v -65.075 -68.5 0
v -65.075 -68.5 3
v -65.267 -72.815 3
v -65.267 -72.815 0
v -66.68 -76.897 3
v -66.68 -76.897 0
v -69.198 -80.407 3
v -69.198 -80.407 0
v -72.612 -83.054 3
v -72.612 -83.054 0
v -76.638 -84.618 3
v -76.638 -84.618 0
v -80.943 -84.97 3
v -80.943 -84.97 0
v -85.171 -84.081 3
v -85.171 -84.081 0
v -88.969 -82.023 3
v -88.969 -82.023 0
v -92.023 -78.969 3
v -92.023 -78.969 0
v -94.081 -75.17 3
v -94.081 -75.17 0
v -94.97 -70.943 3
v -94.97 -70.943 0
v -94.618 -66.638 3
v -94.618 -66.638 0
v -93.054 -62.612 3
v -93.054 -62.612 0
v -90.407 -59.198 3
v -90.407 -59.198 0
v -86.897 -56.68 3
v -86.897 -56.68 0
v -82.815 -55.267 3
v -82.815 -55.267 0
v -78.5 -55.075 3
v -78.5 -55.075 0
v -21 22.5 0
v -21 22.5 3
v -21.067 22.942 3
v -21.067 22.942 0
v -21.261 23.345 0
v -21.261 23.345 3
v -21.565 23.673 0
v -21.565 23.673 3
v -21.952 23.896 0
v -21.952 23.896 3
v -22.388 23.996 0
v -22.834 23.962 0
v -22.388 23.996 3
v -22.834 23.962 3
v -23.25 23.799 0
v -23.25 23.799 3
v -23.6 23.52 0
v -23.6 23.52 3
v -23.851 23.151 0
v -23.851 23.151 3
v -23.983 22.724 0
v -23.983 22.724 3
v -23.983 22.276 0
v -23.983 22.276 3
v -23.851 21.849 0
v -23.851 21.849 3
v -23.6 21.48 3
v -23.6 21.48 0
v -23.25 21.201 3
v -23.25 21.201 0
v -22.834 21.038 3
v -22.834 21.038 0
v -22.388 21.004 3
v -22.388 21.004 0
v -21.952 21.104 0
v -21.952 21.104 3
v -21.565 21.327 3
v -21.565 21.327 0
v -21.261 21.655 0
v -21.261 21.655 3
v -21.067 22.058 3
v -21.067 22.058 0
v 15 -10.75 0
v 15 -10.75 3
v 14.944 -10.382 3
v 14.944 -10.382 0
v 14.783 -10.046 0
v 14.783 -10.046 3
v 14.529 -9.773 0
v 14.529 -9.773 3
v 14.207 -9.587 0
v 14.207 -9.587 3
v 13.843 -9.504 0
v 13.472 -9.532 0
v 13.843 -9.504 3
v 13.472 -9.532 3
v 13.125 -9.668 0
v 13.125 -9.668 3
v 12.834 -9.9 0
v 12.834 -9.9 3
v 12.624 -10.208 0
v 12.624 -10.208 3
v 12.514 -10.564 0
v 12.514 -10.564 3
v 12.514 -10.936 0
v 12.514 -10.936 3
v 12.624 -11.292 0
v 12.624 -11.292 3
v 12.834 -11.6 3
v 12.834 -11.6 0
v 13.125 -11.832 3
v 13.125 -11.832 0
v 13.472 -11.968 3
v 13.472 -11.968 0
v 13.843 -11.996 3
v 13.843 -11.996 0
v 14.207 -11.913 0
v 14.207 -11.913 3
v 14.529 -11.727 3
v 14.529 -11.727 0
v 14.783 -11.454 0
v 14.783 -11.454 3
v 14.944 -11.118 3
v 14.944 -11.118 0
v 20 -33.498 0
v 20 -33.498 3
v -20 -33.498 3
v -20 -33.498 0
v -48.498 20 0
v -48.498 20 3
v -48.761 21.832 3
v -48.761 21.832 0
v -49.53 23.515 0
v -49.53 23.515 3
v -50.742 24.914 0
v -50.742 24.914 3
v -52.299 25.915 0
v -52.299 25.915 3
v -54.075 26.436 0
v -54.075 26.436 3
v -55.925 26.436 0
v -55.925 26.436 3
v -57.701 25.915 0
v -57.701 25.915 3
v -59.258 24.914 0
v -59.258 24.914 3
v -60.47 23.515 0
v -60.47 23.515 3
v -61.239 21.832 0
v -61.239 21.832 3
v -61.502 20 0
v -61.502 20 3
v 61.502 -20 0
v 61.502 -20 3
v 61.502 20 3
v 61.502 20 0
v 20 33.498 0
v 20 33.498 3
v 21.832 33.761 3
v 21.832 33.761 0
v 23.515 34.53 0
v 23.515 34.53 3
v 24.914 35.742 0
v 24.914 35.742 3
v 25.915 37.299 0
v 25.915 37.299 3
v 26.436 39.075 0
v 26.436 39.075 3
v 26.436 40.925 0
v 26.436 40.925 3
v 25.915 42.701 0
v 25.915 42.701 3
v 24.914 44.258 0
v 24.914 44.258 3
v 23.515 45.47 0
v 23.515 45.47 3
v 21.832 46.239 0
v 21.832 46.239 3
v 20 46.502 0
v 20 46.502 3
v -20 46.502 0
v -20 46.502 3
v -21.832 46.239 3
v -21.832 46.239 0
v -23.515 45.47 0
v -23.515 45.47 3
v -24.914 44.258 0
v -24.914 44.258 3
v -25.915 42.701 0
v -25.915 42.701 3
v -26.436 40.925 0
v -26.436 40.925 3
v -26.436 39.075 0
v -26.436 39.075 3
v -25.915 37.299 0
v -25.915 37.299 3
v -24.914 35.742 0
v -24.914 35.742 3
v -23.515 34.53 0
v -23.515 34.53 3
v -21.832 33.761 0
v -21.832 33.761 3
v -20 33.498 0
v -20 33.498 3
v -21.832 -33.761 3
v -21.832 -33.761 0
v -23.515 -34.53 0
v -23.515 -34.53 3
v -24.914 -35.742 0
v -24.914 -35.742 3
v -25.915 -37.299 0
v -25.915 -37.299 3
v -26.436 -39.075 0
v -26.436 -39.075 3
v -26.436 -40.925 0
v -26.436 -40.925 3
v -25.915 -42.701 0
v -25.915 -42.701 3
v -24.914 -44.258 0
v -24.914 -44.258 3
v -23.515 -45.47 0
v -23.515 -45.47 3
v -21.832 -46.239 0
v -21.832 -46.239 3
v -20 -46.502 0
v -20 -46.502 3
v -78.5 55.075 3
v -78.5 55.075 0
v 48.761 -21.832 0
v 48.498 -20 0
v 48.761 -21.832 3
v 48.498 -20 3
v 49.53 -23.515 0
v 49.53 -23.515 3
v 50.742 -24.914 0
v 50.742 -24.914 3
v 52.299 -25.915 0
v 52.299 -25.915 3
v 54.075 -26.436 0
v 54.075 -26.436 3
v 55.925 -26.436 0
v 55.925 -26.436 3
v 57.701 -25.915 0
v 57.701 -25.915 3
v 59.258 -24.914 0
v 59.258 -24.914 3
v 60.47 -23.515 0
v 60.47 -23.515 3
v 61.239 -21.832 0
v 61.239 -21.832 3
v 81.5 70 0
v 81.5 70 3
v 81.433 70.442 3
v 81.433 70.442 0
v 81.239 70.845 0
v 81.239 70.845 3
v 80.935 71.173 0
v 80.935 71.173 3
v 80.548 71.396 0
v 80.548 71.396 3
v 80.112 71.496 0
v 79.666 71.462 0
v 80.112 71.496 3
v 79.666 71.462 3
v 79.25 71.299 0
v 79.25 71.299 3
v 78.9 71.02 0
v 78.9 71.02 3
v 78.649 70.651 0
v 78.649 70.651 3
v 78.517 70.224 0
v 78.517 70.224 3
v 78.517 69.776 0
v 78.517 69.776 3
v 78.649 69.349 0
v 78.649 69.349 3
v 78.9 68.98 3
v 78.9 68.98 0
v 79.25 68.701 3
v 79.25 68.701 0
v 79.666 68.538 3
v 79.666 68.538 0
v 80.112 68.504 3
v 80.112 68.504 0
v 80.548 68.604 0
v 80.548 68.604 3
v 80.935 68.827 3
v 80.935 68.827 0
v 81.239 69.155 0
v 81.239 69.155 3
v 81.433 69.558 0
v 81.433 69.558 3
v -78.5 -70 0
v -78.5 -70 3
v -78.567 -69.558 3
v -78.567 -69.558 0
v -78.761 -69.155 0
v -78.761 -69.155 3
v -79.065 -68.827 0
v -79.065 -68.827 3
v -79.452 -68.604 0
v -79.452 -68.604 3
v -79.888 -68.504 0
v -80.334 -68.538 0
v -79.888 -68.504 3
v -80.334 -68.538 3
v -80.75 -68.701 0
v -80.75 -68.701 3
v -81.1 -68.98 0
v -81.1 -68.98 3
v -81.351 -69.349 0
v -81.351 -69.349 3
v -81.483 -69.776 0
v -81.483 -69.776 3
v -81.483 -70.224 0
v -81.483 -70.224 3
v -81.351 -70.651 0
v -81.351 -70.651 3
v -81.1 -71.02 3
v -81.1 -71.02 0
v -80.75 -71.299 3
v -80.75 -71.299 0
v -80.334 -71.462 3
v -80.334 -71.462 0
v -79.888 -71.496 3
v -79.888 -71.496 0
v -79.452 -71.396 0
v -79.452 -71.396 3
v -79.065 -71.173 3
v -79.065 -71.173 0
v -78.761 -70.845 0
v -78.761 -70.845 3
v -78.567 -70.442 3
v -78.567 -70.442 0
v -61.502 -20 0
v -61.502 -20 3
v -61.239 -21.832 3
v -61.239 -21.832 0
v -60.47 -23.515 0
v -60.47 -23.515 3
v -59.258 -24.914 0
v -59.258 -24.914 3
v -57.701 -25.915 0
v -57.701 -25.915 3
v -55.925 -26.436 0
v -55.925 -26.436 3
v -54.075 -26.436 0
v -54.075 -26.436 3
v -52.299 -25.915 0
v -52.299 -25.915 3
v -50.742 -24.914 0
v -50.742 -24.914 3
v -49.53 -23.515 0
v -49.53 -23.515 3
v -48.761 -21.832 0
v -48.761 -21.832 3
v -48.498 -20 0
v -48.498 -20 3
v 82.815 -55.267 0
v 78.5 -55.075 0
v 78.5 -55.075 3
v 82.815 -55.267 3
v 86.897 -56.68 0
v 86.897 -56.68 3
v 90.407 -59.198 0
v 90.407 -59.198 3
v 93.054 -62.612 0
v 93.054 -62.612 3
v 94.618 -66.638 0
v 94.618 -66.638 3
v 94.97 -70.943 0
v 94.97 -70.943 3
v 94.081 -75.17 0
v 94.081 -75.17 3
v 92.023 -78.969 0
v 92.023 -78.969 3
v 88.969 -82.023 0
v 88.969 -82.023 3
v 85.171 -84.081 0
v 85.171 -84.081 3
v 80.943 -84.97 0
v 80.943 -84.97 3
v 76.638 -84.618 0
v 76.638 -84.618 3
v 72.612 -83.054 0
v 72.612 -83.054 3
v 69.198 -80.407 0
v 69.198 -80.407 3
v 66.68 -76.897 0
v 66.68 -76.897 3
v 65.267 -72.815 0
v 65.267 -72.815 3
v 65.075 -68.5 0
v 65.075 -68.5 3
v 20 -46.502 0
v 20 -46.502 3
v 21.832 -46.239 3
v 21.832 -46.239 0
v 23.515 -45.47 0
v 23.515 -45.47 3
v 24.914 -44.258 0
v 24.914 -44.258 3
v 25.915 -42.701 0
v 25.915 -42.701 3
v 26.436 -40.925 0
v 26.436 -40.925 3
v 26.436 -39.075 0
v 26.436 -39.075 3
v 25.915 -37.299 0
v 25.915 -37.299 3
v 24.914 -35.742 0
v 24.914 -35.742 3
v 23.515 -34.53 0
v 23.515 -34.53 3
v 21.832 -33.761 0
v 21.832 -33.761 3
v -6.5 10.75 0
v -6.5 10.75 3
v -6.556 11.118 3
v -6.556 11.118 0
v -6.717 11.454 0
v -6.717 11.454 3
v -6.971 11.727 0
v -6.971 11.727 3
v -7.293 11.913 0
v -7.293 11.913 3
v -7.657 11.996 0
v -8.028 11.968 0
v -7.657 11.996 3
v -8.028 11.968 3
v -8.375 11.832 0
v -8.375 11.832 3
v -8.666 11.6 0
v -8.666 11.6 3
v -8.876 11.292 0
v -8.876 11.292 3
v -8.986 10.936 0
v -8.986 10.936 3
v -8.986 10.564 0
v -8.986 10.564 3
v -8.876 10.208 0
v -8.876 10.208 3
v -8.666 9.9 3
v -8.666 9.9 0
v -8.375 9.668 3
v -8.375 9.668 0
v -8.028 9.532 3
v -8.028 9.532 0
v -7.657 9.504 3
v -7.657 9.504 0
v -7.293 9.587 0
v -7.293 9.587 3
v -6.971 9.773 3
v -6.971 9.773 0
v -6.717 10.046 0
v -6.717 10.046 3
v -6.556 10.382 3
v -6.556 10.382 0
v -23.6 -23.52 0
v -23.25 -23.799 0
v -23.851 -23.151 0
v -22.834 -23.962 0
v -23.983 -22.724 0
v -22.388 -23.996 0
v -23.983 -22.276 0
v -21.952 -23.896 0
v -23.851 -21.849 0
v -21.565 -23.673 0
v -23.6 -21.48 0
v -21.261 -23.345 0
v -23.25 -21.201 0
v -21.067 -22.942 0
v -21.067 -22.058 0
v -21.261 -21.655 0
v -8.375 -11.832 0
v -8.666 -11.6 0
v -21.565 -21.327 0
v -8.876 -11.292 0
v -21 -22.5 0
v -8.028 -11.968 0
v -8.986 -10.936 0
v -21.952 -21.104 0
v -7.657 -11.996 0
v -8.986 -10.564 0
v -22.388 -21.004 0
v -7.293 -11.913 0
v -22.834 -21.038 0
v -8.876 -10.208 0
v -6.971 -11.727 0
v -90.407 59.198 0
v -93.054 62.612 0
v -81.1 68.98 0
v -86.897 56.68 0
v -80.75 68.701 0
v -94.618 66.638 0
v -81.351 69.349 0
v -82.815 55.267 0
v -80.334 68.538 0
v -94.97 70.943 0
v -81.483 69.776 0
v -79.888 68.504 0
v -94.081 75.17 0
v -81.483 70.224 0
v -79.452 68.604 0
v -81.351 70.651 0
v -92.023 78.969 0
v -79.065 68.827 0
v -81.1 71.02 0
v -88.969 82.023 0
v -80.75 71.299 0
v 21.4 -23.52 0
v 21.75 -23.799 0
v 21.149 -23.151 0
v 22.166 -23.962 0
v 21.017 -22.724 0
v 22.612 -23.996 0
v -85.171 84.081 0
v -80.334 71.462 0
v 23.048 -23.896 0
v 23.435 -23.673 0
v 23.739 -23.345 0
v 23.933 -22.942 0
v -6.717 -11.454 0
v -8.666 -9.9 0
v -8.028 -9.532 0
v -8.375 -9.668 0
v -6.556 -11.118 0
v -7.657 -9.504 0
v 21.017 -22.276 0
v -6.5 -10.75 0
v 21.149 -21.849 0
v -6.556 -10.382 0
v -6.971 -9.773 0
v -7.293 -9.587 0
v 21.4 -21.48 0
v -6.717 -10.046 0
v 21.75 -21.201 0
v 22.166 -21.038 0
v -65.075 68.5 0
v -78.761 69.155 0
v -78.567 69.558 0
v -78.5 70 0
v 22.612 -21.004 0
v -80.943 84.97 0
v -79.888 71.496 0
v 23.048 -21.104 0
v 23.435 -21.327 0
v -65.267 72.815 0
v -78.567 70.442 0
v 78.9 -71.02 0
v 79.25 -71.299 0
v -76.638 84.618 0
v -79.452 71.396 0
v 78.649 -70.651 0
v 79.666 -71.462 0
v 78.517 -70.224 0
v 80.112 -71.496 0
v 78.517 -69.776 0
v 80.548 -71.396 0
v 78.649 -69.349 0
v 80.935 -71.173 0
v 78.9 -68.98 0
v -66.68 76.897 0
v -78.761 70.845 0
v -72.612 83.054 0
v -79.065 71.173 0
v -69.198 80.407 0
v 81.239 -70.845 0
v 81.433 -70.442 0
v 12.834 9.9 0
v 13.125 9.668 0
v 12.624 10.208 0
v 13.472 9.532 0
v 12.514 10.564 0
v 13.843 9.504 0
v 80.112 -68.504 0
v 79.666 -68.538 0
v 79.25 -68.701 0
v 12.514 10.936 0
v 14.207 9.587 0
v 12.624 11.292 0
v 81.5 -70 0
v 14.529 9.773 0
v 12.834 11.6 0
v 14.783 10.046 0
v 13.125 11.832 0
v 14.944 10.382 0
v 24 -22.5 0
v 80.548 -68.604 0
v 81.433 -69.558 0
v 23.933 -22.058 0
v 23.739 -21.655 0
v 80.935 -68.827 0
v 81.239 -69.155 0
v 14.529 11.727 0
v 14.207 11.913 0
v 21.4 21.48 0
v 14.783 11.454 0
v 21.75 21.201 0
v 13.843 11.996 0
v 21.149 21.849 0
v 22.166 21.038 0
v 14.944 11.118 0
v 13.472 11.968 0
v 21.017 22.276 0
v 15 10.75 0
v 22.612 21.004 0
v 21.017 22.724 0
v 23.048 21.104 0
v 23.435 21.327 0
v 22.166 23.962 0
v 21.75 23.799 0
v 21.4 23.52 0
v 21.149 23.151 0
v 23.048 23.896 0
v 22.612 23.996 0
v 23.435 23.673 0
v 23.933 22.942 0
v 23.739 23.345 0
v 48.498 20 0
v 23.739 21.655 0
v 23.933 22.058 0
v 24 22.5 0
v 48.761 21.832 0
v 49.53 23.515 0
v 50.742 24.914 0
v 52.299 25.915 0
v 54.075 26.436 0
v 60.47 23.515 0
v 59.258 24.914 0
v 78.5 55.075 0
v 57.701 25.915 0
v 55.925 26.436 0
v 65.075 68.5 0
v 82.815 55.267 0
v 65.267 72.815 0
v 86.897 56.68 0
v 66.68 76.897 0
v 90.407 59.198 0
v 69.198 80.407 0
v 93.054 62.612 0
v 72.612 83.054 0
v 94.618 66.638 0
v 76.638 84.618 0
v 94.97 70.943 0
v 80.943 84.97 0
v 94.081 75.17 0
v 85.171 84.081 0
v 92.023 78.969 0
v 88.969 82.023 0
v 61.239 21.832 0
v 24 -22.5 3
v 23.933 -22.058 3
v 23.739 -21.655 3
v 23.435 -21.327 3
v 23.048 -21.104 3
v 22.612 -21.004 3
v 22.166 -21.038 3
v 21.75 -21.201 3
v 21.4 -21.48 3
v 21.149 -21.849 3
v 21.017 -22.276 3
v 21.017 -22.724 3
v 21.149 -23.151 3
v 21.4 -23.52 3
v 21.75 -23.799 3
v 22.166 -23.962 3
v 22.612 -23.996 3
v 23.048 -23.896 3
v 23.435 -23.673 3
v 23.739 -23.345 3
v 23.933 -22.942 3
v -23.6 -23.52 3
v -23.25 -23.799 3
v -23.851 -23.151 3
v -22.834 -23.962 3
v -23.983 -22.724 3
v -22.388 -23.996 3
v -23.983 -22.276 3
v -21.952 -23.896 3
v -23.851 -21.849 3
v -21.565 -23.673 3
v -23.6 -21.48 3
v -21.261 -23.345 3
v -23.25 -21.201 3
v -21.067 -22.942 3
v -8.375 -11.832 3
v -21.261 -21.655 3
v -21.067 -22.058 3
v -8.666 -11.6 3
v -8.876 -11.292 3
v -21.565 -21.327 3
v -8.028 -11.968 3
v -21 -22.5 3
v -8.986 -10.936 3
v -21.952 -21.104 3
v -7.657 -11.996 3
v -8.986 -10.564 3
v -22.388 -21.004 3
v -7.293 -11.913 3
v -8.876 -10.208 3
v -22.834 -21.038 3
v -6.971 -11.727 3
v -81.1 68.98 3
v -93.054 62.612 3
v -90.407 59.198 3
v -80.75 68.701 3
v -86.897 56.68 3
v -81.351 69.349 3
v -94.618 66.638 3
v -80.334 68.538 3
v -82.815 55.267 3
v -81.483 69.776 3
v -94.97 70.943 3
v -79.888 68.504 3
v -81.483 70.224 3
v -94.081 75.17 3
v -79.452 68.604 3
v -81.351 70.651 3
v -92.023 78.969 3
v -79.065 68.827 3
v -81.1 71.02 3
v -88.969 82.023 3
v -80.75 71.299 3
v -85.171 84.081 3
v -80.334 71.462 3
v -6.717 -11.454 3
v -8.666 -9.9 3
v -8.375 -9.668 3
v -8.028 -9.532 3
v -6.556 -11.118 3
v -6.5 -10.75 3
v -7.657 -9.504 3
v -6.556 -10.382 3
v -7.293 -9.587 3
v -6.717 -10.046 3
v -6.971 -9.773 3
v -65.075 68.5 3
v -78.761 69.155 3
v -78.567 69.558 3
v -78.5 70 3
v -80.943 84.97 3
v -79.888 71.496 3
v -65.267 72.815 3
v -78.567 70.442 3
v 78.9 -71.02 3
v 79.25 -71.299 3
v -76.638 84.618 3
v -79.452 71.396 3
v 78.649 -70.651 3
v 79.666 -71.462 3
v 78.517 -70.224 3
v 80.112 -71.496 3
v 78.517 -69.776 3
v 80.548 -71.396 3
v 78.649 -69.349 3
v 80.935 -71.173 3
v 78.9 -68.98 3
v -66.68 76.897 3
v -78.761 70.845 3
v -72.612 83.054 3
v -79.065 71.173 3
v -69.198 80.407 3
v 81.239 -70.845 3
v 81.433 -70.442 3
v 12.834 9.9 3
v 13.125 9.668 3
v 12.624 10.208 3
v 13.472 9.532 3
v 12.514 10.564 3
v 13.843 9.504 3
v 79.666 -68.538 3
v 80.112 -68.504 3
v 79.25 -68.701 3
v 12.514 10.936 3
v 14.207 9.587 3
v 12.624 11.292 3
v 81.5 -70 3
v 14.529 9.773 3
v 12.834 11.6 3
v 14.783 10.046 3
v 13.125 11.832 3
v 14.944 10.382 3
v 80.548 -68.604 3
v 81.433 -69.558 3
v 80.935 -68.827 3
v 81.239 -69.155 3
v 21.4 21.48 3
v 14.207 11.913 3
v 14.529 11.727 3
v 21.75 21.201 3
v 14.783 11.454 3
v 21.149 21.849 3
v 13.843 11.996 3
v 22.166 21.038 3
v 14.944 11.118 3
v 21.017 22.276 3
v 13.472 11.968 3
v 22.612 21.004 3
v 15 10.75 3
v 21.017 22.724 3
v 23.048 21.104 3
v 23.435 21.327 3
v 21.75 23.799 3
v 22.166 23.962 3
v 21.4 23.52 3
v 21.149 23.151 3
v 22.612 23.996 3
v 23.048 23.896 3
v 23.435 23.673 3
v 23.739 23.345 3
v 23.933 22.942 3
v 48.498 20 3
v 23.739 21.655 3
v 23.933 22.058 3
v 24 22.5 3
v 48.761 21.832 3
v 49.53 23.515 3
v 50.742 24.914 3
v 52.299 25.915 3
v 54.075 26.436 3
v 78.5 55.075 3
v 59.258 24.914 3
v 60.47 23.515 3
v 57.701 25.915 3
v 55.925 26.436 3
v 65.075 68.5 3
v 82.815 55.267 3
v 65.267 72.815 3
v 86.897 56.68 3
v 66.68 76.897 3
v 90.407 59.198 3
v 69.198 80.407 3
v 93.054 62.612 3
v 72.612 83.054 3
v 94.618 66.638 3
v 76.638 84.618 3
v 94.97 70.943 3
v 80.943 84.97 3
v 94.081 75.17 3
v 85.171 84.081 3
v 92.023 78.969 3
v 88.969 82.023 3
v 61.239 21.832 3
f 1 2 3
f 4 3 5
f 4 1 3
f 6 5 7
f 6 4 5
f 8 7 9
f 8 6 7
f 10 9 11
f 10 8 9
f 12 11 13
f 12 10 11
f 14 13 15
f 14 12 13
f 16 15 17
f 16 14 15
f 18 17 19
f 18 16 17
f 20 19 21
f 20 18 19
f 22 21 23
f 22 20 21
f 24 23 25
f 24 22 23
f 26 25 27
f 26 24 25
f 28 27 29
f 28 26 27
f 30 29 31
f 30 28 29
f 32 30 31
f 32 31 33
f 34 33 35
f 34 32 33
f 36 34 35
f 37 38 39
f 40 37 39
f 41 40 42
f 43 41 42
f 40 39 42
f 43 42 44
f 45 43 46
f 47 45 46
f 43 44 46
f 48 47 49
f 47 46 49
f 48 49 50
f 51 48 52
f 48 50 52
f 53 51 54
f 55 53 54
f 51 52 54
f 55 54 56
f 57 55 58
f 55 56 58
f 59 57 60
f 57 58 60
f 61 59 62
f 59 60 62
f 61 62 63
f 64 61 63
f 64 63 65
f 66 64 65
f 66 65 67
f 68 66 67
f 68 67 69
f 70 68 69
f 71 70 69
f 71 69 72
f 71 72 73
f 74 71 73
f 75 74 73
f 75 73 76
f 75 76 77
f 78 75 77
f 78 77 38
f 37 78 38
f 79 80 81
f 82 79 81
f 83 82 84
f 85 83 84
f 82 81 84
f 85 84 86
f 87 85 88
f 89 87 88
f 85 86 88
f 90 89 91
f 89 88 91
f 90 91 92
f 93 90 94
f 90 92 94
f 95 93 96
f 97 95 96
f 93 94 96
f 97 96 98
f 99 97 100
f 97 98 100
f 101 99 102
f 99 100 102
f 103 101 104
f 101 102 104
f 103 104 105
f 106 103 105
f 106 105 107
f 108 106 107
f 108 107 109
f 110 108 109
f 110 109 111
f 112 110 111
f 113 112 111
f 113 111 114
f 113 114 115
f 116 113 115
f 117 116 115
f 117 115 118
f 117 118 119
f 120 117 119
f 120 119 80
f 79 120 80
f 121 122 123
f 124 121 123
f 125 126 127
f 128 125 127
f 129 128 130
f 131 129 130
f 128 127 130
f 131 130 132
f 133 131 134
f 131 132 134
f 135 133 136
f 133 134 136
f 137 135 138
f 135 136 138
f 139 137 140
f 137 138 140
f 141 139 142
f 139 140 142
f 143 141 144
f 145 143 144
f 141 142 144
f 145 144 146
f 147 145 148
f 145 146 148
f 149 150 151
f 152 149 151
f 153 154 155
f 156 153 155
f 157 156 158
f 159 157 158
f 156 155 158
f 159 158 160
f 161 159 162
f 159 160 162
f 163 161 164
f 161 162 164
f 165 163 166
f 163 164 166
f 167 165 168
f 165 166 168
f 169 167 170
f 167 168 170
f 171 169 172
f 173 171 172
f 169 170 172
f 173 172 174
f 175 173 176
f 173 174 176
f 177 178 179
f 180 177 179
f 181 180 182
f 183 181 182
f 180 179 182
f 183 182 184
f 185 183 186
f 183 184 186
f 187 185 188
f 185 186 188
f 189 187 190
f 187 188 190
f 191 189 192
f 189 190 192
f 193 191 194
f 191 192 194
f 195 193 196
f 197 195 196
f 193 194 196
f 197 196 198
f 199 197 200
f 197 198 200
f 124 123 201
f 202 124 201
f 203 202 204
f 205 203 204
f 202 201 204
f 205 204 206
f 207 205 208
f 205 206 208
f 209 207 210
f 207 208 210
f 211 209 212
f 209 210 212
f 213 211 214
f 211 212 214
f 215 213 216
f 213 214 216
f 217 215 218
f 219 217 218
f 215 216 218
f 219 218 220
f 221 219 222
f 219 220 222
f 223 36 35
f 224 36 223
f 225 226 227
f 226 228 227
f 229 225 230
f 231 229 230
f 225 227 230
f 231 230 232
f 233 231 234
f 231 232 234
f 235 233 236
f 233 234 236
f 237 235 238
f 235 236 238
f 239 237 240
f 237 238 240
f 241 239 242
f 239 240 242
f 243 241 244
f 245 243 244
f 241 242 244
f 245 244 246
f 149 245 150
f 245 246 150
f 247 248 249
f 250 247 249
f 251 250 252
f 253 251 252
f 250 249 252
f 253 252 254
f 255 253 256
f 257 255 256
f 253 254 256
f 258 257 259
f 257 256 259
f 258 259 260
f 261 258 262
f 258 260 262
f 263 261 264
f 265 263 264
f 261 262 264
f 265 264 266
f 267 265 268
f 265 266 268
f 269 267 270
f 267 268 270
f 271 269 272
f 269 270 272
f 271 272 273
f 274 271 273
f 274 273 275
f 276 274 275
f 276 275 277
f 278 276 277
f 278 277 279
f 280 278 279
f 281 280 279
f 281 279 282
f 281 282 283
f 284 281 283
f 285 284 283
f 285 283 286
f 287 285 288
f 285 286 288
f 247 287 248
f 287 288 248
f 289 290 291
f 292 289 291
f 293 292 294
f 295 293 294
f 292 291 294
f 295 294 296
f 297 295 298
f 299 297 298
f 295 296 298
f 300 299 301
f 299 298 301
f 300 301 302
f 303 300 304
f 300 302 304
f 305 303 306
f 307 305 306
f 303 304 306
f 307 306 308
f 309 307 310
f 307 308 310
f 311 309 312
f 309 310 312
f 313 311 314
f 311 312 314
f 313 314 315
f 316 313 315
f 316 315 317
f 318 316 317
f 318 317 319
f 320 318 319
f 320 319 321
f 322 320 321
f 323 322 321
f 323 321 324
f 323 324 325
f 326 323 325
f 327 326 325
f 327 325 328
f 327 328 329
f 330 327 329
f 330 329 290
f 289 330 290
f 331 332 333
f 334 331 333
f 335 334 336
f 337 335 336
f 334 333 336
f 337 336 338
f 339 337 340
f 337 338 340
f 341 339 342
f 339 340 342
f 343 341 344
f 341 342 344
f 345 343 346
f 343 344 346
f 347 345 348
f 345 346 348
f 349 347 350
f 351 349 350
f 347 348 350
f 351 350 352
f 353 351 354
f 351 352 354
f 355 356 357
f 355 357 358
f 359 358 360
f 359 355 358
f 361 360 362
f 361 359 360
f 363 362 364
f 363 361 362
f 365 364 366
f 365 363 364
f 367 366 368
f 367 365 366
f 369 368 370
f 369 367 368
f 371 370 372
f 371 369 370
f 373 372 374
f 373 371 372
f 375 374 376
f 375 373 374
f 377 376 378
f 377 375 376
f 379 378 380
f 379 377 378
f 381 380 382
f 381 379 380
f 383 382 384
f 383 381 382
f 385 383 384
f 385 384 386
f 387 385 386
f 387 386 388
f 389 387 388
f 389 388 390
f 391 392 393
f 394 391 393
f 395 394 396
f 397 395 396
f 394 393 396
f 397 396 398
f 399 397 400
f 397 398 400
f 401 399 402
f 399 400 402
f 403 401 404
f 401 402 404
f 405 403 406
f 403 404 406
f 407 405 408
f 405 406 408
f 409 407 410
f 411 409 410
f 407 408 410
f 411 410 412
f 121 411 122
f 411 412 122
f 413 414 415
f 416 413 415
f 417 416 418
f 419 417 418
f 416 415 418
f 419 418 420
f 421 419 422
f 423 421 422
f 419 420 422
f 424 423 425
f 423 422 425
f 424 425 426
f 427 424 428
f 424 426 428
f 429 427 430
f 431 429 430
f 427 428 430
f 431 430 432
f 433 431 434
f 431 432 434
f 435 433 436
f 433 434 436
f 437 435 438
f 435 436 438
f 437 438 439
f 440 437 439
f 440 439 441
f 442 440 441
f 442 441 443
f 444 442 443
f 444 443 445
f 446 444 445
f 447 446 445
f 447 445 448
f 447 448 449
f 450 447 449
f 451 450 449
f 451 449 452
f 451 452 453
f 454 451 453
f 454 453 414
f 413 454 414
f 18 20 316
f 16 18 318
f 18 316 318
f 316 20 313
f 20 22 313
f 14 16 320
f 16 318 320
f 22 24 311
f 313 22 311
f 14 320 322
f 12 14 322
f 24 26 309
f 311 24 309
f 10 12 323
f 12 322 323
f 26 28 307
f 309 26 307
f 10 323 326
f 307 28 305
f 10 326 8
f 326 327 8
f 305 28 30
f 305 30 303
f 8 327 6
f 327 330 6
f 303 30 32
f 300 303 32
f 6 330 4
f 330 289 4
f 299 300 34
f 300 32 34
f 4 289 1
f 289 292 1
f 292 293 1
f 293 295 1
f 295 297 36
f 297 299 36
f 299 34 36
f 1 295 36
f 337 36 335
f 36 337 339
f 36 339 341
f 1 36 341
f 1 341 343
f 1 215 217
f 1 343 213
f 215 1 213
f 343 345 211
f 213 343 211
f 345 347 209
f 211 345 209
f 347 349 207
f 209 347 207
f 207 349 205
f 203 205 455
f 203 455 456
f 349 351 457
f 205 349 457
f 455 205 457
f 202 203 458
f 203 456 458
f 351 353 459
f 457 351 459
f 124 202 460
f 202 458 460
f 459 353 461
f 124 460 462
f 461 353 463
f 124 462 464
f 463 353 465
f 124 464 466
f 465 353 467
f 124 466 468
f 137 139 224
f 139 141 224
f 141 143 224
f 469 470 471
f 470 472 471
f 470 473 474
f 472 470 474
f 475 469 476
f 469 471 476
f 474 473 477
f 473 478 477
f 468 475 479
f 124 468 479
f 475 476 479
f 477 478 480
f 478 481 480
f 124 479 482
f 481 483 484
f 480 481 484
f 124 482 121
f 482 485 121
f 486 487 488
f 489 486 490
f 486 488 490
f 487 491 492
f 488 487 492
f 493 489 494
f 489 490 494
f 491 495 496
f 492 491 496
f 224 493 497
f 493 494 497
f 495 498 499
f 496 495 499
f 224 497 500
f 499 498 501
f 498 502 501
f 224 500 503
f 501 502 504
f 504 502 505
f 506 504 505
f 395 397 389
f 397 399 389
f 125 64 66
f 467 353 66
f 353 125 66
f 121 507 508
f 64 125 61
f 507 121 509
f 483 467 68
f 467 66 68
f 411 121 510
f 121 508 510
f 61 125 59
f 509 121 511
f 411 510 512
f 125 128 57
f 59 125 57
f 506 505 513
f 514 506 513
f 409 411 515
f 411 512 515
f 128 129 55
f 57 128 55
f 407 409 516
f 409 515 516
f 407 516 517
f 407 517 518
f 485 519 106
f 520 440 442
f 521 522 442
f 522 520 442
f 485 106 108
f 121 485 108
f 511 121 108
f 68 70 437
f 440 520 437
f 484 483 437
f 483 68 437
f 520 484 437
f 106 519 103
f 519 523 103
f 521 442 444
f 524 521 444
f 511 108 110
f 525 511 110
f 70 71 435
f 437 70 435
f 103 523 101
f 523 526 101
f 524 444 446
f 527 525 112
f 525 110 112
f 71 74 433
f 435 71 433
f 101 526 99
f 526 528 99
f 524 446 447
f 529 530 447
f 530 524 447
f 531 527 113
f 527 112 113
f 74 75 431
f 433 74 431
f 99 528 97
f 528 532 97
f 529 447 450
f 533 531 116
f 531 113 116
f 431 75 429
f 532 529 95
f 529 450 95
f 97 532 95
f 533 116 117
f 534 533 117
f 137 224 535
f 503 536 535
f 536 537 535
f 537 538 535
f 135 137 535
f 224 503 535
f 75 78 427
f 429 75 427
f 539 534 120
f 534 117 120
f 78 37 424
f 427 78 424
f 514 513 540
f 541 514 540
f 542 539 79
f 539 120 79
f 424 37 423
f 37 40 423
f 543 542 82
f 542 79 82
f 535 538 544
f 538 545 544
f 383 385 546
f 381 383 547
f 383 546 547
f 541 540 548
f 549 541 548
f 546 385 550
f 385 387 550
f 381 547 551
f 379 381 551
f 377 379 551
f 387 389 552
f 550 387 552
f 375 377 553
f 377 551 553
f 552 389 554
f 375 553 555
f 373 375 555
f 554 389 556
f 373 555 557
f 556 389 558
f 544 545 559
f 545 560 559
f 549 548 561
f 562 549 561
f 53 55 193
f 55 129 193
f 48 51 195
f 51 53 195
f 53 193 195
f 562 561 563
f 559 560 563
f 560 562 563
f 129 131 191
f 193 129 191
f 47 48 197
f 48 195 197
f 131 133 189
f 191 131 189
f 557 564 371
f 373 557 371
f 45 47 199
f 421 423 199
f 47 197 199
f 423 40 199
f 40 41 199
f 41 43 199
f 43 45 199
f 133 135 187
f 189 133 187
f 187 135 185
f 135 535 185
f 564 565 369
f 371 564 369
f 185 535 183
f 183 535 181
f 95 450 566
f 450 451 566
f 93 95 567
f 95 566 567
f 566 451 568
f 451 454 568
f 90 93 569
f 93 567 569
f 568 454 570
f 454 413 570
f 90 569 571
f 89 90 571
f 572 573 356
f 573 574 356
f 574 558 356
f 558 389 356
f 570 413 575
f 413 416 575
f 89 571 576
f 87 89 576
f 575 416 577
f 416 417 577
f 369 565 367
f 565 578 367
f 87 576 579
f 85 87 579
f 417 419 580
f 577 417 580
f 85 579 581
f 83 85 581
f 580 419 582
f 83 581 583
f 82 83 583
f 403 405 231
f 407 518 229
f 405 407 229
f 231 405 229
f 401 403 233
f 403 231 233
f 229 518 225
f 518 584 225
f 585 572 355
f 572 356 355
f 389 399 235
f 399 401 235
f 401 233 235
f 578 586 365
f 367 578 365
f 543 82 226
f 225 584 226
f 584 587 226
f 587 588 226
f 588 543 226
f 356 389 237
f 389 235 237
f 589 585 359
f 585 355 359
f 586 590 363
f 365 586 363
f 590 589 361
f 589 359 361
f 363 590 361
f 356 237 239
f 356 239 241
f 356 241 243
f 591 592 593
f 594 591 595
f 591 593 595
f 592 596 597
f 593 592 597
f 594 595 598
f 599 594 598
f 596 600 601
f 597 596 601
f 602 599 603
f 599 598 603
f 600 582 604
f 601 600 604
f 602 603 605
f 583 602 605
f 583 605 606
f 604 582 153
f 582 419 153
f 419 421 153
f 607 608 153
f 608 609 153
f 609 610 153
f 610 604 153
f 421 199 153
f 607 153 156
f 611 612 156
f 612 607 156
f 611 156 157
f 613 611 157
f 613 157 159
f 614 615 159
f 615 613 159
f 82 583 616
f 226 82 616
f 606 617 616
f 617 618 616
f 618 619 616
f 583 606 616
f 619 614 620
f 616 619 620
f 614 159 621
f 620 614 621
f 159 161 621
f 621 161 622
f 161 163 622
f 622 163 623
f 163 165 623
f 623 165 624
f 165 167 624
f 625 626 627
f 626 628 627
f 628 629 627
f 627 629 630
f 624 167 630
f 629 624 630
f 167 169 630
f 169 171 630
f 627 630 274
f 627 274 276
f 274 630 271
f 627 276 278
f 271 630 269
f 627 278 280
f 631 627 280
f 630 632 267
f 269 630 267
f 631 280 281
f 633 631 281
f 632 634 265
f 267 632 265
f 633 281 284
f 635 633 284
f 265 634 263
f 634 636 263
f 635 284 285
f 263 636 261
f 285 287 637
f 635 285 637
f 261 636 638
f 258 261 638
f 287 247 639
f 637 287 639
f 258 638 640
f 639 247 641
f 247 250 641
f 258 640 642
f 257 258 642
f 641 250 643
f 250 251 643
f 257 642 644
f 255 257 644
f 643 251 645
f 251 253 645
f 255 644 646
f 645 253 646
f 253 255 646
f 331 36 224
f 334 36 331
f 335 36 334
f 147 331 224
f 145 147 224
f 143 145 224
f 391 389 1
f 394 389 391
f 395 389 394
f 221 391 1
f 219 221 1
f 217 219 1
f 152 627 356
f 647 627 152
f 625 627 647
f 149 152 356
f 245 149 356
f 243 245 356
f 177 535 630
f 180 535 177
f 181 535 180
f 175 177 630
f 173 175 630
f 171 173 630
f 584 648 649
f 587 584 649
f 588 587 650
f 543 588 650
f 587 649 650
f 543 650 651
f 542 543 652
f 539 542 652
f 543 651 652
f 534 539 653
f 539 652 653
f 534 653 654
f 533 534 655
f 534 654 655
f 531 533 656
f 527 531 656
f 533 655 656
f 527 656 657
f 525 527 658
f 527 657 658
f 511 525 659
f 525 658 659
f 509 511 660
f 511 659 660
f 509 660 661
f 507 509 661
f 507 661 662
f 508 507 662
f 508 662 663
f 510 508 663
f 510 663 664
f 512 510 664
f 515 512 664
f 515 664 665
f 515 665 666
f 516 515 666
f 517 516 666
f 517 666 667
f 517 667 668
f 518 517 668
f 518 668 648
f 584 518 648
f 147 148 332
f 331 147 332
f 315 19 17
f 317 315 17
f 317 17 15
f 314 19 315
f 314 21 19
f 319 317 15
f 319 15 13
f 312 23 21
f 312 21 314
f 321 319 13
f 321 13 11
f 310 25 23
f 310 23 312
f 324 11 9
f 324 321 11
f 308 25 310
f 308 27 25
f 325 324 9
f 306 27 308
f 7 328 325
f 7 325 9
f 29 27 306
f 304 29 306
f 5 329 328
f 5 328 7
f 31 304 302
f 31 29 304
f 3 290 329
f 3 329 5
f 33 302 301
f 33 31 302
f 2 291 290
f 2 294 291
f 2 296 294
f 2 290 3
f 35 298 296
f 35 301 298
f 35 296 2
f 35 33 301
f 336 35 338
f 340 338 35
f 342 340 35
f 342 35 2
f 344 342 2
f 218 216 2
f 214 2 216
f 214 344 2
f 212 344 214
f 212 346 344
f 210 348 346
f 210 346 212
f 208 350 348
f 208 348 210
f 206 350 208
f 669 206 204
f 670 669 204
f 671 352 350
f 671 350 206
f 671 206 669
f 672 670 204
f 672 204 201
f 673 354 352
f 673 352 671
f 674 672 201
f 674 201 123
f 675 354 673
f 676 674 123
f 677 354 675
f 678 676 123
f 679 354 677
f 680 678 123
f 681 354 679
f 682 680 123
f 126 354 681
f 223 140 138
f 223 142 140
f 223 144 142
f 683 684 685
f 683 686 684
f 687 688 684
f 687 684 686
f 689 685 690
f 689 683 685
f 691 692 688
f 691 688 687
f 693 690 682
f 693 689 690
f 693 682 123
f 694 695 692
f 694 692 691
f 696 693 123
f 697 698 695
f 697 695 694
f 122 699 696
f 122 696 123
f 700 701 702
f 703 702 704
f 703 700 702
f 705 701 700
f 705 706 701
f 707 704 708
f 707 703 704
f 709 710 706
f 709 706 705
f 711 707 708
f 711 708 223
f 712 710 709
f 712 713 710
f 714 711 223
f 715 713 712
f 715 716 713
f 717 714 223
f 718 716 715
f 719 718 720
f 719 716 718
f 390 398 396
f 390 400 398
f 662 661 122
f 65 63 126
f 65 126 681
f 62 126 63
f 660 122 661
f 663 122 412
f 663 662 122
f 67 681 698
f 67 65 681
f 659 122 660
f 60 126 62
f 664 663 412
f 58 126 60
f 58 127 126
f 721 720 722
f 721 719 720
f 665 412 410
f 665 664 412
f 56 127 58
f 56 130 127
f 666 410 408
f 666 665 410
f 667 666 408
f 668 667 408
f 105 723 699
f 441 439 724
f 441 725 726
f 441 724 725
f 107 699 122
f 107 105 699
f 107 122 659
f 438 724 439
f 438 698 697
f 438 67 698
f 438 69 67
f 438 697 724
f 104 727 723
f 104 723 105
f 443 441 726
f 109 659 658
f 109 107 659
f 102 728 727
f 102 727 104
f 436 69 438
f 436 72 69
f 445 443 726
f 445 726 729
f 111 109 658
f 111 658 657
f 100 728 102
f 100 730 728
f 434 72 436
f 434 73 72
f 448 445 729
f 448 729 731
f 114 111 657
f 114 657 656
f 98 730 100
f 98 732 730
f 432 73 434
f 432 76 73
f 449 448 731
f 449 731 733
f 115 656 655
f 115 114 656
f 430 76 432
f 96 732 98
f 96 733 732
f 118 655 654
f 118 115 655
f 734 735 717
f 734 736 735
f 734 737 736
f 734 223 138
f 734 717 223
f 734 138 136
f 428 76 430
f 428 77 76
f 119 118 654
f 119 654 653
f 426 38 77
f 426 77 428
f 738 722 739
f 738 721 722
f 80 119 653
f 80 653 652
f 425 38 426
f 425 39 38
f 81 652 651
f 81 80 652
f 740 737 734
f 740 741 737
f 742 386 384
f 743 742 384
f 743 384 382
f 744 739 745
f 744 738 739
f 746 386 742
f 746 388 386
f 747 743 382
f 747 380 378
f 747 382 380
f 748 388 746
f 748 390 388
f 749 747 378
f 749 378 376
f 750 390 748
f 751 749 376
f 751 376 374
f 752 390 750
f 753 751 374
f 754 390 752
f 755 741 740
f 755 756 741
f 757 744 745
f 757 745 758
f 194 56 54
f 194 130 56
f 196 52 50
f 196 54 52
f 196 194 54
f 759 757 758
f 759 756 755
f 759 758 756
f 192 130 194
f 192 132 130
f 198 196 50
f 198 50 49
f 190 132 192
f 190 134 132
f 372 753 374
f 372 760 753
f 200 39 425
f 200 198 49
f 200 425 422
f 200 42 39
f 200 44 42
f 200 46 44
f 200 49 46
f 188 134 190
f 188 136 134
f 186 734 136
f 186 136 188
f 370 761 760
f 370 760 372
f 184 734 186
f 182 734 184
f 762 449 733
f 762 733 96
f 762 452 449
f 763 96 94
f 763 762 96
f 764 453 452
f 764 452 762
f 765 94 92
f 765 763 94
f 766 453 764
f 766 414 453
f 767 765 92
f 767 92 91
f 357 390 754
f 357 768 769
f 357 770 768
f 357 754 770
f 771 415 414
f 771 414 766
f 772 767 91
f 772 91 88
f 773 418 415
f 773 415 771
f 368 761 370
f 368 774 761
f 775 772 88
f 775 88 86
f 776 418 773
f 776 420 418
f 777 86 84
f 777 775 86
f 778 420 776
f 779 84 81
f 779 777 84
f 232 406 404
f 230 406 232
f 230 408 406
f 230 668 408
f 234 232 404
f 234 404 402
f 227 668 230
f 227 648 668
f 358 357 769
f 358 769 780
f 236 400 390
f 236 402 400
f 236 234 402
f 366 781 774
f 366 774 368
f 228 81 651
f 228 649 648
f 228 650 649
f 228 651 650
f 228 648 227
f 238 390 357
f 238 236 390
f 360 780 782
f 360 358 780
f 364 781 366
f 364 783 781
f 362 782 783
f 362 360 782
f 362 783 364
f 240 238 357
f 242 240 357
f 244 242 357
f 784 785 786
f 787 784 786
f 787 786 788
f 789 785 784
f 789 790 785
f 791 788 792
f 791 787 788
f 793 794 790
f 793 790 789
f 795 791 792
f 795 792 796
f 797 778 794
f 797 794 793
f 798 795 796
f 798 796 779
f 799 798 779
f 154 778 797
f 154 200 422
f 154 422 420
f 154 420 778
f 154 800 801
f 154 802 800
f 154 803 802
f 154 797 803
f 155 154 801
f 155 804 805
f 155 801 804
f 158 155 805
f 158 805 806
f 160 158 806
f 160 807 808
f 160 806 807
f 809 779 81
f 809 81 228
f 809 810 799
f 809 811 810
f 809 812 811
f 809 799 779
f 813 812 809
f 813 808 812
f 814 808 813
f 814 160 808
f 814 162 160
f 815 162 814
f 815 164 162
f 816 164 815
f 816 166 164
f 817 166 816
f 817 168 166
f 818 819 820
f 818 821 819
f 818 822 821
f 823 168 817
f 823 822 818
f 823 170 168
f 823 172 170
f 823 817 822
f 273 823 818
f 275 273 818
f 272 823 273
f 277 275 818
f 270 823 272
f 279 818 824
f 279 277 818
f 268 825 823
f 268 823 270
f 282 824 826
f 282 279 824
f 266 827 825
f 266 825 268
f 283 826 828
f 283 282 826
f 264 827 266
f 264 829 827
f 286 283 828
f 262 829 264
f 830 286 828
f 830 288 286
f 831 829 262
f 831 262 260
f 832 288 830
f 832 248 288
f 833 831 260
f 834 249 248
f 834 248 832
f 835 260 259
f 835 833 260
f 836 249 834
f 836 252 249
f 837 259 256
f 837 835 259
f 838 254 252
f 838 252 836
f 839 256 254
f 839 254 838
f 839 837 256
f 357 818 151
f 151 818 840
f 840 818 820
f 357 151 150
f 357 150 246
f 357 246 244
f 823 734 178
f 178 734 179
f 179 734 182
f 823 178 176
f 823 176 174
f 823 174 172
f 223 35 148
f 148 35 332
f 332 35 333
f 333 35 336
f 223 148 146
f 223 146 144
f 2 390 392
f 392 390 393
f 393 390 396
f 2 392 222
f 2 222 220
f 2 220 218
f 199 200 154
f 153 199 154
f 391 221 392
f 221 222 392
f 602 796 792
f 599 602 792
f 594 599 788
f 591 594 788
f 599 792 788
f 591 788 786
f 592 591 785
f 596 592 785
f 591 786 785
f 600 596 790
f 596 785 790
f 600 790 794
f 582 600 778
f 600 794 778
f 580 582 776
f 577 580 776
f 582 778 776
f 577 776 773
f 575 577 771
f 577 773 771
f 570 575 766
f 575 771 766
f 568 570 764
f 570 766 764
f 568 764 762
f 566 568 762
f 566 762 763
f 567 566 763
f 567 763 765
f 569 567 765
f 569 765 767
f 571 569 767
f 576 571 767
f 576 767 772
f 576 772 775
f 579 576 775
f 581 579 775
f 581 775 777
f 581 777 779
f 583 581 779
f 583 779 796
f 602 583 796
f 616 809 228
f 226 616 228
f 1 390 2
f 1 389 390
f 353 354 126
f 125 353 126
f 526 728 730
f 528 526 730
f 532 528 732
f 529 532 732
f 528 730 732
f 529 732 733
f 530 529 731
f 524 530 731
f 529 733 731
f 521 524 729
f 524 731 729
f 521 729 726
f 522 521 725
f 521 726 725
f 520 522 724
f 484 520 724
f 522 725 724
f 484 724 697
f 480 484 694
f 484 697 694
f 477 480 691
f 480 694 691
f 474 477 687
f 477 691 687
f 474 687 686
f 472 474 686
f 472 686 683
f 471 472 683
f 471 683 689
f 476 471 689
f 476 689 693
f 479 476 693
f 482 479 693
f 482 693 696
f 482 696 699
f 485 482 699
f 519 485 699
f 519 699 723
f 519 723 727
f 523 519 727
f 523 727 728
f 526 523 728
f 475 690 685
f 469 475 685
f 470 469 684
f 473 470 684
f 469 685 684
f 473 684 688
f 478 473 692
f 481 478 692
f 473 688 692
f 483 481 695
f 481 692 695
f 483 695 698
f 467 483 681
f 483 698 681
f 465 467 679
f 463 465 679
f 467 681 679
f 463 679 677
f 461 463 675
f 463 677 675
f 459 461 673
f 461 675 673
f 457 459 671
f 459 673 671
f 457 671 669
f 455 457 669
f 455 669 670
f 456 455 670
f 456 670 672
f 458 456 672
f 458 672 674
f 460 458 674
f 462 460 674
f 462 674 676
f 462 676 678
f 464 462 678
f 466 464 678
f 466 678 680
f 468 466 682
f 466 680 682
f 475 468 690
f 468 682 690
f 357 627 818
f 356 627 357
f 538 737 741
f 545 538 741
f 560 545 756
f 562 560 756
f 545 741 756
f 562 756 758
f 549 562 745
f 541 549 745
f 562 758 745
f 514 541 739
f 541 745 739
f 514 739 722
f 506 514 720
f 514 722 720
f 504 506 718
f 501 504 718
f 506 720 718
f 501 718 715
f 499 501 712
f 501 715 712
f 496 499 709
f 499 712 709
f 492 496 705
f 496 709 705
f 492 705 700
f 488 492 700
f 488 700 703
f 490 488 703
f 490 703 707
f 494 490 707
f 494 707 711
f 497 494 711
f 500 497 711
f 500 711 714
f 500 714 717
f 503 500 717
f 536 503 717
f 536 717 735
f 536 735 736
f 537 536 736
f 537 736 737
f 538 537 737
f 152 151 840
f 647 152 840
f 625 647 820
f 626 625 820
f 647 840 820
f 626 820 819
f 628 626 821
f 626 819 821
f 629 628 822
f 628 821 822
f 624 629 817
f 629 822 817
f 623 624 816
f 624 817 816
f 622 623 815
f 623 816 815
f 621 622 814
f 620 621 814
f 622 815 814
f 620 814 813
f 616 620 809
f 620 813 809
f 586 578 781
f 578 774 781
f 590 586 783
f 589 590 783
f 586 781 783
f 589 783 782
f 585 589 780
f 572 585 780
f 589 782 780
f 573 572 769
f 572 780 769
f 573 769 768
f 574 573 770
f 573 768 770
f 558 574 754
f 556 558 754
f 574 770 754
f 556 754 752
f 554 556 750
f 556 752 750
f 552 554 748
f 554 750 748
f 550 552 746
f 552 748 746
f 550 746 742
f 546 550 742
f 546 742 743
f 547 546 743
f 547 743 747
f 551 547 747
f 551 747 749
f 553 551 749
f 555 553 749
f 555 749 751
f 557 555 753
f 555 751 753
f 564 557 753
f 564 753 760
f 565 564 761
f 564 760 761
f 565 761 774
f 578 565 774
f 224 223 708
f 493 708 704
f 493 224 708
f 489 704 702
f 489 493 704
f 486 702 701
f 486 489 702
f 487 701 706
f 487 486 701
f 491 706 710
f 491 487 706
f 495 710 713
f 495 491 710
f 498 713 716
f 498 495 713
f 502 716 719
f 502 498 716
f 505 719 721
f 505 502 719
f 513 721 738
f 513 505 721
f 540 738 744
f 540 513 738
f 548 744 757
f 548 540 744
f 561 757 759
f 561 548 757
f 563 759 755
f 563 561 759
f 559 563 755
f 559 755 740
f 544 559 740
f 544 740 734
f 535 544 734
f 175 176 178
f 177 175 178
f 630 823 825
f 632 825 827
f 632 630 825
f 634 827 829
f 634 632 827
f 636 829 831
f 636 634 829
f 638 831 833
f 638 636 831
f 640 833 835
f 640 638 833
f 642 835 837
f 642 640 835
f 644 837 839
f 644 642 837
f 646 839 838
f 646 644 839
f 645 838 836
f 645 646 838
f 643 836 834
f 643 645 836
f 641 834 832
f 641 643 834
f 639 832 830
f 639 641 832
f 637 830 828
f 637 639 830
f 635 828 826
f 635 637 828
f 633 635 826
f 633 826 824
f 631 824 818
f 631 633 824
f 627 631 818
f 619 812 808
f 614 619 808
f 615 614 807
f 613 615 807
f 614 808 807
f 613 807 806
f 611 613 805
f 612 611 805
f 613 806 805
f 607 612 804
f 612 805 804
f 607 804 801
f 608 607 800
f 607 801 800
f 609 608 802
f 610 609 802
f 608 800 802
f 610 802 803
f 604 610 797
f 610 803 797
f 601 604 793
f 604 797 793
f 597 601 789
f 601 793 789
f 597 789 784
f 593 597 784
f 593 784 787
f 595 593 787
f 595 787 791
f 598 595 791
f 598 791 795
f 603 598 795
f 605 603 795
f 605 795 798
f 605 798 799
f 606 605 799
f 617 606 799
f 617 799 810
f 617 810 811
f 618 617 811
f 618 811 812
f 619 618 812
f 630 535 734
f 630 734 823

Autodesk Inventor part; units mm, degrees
ref_plane "YZ Plane" through (0, 0, 0) normal (1, 0, 0) x (0, 1, 0)
ref_plane "XZ Plane" through (0, 0, 0) normal (0, 1, 0) x (-1, 0, 0)
ref_plane "XY Plane" through (0, 0, 0) normal (0, 0, 1) x (1, 0, 0)
sketch "Sketch1" plane through (0, 0, 0) normal (0, 0, 1) x (1, 0, 0)
  point P0 (0, 0)
sketch "Sketch2" plane through (0, 0, 0) normal (0, 0, 1) x (1, 0, 0)
  line L0 (78.4999, -68.5) -> (-78.4999, -68.5)
  line L1 (-78.4999, -68.5) -> (-78.4999, 68.5)
  line L2 (-78.4999, 68.5) -> (78.4999, 68.5)
  line L3 (78.4999, 68.5) -> (78.4999, -68.5)
  circle A0 centre (80, 70) radius 14.9999
  circle A1 centre (-80, 70) radius 14.9999
  circle A2 centre (-80, -70) radius 14.9999
  circle A3 centre (80, -70) radius 14.9999
  point P0 (78.4999, -55.0753)
  point P1 (78.4999, 55.0753)
  point P2 (65.0752, 68.5)
  point P3 (-65.0752, 68.5)
  point P4 (-78.4999, 55.0753)
  point P5 (-78.4999, -55.0753)
  point P6 (-65.0752, -68.5)
  point P7 (65.0752, -68.5)
extrude "Extrusion1" add sketch "Sketch2" along normal blind 3
sketch "Sketch5" plane through (0, 0, 3) normal (0, 0, 1) x (1, 0, 0)
  circle A0 centre (80, 70) radius 1.4999
  circle A1 centre (-80, 70) radius 1.4999
  circle A2 centre (-80, -70) radius 1.4999
  circle A3 centre (80, -70) radius 1.4999
extrude "Extrusion2" cut sketch "Sketch5" against normal blind 10
sketch "Sketch6" plane through (0, 0, 3) normal (0, 0, 1) x (1, 0, 0)
  point P0 (0, 0)
sketch "Cable cutouts" plane through (0, 0, 3) normal (0, 0, 1) x (1, 0, 0)
  line L0 (65.0752, 68.5) -> (-65.0752, 68.5) projected
  line L1 (-20.0003, 40) -> (20.0003, 40) construction
  line L2 (-20.0003, 33.4981) -> (20.0003, 33.4981)
  line L3 (20.0003, 46.5019) -> (-20.0003, 46.5019)
  arc A0 (-20.0003, 46.5019) -> (-20.0003, 33.4981) centre (-20.0003, 40) ccw
  arc A1 (20.0003, 33.4981) -> (20.0003, 46.5019) centre (20.0003, 40) ccw
  line L4 (-20.0003, -40) -> (20.0003, -40) construction
  line L5 (-20.0003, -46.5019) -> (20.0003, -46.5019)
  line L6 (20.0003, -33.4981) -> (-20.0003, -33.4981)
  arc A2 (-20.0003, -33.4981) -> (-20.0003, -46.5019) centre (-20.0003, -40) ccw
  arc A3 (20.0003, -46.5019) -> (20.0003, -33.4981) centre (20.0003, -40) ccw
  line L7 (55, -20.0003) -> (55, 20.0003) construction
  arc A4 (48.4981, -20.0003) -> (61.5019, -20.0003) centre (55, -20.0003) ccw
  arc A5 (61.5019, 20.0003) -> (48.4981, 20.0003) centre (55, 20.0003) ccw
  line L8 (48.4981, 20.0003) -> (48.4981, -20.0003)
  line L9 (61.5019, -20.0003) -> (61.5019, 20.0003)
  line L10 (-55, -20.0003) -> (-55, 20.0003) construction
  arc A6 (-61.5019, -20.0003) -> (-48.4981, -20.0003) centre (-55, -20.0003) ccw
  arc A7 (-48.4981, 20.0003) -> (-61.5019, 20.0003) centre (-55, 20.0003) ccw
  line L11 (-61.5019, 20.0003) -> (-61.5019, -20.0003)
  line L12 (-48.4981, -20.0003) -> (-48.4981, 20.0003)
extrude "Extrusion4" cut sketch "Cable cutouts" against normal blind 10
sketch "Pixhawk 3 Pro mount holes" plane through (0, 0, 3) normal (0, 0, 1) x (1, 0, 0)
  circle A0 centre (13.75, 10.75) radius 1.2498
  circle A1 centre (-7.75, 10.75) radius 1.2498
  circle A2 centre (-7.75, -10.75) radius 1.2498
  circle A3 centre (13.75, -10.75) radius 1.2498
extrude "Extrusion5" cut sketch "Pixhawk 3 Pro mount holes" against normal blind 10
sketch "Anti-vibration mount holes" plane through (0, 0, 3) normal (0, 0, 1) x (1, 0, 0)
  circle A0 centre (22.5, 22.5) radius 1.4999
  circle A1 centre (-22.5, 22.5) radius 1.4999
  circle A2 centre (-22.5, -22.5) radius 1.4999
  circle A3 centre (22.5, -22.5) radius 1.4999
extrude "Extrusion7" cut sketch "Anti-vibration mount holes" against normal blind 10
properties part number "Payload bay KPM" material "CFRP"
